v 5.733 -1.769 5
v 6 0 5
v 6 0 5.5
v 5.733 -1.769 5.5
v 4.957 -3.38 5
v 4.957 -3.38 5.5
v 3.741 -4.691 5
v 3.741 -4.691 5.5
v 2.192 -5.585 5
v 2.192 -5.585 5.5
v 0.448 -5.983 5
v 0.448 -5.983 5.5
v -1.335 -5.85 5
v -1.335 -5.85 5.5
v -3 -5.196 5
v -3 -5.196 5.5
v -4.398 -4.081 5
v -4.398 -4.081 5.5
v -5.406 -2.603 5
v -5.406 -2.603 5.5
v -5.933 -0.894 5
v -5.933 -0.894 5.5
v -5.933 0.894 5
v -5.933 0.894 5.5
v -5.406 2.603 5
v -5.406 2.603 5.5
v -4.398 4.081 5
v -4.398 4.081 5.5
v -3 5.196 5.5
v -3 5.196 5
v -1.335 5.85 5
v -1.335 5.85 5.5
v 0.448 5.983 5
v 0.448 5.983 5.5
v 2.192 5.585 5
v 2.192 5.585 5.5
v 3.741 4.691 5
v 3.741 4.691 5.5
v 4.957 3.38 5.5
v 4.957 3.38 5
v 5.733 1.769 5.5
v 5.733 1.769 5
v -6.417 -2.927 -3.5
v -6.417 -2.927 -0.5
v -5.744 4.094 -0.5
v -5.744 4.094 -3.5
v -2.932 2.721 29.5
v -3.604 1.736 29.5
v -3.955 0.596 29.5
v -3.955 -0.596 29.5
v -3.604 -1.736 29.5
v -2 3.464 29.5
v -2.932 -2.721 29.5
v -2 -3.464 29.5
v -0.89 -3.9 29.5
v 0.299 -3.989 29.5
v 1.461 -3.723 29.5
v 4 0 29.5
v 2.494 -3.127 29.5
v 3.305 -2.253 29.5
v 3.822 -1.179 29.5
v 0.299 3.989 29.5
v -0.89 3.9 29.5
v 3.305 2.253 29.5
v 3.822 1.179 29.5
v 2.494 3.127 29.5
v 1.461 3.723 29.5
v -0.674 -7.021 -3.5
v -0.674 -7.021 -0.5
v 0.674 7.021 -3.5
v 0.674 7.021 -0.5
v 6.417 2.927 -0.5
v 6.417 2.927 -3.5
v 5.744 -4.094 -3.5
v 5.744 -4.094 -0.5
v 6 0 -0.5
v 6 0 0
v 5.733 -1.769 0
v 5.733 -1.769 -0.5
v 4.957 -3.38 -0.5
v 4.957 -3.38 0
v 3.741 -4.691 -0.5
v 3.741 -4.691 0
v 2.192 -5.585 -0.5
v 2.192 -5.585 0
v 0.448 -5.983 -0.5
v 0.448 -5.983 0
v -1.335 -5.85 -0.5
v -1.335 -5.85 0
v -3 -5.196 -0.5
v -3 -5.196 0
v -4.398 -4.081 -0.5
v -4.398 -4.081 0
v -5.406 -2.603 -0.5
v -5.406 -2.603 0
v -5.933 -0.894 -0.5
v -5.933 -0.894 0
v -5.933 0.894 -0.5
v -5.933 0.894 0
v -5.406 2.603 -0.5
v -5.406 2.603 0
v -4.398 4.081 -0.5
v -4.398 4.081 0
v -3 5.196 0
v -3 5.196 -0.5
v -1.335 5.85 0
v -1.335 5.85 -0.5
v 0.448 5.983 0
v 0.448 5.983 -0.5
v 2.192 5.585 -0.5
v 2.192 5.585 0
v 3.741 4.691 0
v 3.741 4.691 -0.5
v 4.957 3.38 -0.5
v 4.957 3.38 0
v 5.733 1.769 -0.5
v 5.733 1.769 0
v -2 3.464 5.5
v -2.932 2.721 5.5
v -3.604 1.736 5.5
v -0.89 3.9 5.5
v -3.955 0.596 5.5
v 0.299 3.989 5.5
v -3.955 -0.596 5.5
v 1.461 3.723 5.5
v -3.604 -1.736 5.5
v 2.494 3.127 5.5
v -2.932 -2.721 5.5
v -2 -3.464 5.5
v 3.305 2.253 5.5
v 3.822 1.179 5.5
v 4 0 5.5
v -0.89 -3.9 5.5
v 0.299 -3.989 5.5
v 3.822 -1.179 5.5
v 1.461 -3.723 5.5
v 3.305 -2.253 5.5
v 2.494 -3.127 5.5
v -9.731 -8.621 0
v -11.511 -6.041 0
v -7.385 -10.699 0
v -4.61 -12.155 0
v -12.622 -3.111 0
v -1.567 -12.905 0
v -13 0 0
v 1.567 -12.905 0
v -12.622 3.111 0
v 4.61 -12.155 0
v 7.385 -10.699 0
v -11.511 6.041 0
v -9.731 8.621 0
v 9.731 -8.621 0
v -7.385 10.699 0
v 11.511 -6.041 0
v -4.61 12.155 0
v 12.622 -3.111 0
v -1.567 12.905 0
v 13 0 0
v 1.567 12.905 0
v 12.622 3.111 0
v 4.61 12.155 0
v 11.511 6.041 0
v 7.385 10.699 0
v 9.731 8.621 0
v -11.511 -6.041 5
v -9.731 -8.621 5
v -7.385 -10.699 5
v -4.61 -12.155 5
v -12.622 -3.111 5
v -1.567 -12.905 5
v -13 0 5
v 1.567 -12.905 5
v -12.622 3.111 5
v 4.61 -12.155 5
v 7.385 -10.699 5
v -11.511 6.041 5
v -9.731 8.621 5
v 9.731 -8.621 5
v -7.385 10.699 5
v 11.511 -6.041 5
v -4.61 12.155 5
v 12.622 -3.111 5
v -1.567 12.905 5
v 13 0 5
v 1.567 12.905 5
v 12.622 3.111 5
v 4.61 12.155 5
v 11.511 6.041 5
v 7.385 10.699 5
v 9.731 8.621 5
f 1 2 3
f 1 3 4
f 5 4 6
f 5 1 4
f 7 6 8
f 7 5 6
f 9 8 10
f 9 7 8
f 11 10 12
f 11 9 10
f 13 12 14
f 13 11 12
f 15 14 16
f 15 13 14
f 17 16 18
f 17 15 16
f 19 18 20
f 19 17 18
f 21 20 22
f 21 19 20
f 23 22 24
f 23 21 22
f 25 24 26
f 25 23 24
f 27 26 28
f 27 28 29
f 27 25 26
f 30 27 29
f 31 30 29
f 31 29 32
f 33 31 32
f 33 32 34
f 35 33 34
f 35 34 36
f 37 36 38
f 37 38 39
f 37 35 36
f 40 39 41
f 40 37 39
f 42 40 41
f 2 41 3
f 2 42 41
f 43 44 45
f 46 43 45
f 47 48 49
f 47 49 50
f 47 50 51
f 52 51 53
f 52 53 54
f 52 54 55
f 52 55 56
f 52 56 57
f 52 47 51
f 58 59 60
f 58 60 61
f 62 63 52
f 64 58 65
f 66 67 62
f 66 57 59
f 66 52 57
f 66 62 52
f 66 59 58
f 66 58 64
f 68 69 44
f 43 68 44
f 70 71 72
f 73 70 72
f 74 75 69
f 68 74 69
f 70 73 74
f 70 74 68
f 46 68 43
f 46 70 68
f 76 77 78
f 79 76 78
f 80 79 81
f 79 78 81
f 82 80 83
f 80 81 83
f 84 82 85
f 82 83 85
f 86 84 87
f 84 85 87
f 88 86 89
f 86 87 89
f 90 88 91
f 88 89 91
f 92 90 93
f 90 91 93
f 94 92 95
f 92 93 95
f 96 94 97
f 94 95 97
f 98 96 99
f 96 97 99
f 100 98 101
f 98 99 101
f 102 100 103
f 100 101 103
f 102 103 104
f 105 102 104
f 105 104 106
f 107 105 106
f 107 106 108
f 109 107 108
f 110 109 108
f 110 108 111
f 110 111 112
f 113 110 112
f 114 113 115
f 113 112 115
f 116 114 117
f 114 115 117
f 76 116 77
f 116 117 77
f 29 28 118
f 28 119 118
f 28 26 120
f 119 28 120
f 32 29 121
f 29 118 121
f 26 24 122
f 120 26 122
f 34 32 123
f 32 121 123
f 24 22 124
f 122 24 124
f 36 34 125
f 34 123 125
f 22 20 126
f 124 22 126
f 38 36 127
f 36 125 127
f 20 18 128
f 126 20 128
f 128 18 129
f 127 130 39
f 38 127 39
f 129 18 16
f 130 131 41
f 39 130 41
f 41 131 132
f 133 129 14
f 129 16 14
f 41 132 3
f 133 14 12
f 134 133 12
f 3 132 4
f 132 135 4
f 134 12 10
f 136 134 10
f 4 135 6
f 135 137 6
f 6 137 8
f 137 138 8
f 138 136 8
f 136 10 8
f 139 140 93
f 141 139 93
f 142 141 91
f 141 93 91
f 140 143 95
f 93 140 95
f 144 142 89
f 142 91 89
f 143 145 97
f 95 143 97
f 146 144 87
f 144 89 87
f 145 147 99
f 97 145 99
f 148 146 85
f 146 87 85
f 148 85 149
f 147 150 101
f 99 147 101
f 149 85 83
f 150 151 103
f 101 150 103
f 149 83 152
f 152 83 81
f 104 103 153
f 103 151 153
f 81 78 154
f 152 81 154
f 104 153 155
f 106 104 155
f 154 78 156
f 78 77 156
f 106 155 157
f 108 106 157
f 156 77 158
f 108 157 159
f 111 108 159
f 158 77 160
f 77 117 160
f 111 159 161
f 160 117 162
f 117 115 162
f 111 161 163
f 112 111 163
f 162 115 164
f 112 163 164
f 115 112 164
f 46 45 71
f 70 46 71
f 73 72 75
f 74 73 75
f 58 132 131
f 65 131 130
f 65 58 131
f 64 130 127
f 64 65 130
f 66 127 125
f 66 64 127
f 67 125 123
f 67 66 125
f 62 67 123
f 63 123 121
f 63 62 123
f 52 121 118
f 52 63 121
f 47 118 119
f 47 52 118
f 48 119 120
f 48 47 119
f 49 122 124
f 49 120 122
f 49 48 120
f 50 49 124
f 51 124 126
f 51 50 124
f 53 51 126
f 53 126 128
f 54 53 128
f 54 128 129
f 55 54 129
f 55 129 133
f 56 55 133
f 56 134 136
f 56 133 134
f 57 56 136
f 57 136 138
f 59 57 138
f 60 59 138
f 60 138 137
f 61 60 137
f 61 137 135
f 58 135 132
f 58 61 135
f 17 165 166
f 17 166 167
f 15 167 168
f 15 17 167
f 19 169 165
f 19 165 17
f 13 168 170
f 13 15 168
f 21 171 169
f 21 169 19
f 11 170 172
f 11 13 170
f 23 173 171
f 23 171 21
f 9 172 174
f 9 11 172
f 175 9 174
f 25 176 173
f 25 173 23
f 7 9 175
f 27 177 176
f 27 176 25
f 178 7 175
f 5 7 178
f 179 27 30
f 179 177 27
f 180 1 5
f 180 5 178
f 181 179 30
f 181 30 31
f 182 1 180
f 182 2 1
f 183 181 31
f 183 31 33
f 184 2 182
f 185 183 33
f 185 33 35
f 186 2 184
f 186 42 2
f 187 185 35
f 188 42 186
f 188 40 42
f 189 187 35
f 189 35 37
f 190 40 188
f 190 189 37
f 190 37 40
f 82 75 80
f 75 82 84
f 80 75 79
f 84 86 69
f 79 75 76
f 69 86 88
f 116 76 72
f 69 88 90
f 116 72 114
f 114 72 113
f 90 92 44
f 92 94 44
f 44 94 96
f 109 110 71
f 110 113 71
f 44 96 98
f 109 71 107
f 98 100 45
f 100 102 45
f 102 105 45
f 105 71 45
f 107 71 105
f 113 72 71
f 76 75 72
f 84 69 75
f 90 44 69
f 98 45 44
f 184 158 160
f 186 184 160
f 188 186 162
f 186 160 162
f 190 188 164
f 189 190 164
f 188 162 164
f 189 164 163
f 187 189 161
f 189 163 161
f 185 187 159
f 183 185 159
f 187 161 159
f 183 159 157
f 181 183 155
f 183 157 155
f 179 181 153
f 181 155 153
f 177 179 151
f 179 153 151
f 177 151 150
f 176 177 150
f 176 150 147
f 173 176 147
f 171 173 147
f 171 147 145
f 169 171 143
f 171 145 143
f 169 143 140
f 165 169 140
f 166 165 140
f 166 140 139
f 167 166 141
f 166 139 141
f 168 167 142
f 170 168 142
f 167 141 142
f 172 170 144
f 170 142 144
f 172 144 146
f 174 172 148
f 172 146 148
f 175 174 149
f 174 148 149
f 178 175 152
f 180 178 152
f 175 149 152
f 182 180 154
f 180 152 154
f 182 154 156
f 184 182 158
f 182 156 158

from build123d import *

# Parameters (mm, degrees)
SKETCH1_R           = 13
BOSS_EXTRUDE1_DEPTH = 5
SKETCH12_R          = 4
CUT_EXTRUDE6_DEPTH  = 5
SKETCH13_R          = 6
BOSS_EXTRUDE7_DEPTH = 0.5
CUT_EXTRUDE7_START  = -0.5
SKETCH14_R          = 4
CUT_EXTRUDE7_DEPTH  = 0.5
BOSS_EXTRUDE8_DEPTH = 3
BOSS_EXTRUDE9_START = 30
SKETCH16_R          = 4
BOSS_EXTRUDE9_DEPTH = 30


with BuildPart() as part:
    # Sketch1 → Boss-Extrude1 (new body)
    with BuildSketch(Plane.XY):
        Circle(SKETCH1_R)
    extrude(amount=BOSS_EXTRUDE1_DEPTH)

    # Sketch12 → Cut-Extrude6 (cut)
    with BuildSketch(Plane.XY.offset(5)):
        Circle(SKETCH12_R)
    extrude(amount=-CUT_EXTRUDE6_DEPTH, mode=Mode.SUBTRACT)

    # Sketch13 → Boss-Extrude7 (add)
    with BuildSketch(Plane(origin=(0, 0, 0), x_dir=(-1, 0, 0), z_dir=(0, 0, -1))):
        with Locations(Location((0, 0, 0), (0, 0, 180))):
            Circle(SKETCH13_R)
    boss_extrude7 = extrude(amount=BOSS_EXTRUDE7_DEPTH)

    # Sketch14 → Cut-Extrude7 (cut)
    with BuildSketch(Plane(origin=(0, 0, -0.5), x_dir=(-1, 0, 0), z_dir=(0, 0, -1)).offset(CUT_EXTRUDE7_START)):
        with Locations(Location((0, 0, 0), (0, 0, 180))):
            Circle(SKETCH14_R)
    cut_extrude7 = extrude(amount=CUT_EXTRUDE7_DEPTH, mode=Mode.SUBTRACT)

    # Mirror2: Boss-Extrude7, Cut-Extrude7 across plane
    add(boss_extrude7.mirror(Plane(origin=(0, 0, 2.5), x_dir=(1, 0, 0), z_dir=(0, 0, -1))))
    add(cut_extrude7.mirror(Plane(origin=(0, 0, 2.5), x_dir=(1, 0, 0), z_dir=(0, 0, -1))), mode=Mode.SUBTRACT)

    # Sketch15 → Boss-Extrude8 (add)
    with BuildSketch(Plane(origin=(0, 0, -0.5), x_dir=(-1, 0, 0), z_dir=(0, 0, -1))):
        Polygon((5.743830787, 4.094007051), (-0.673598715, 7.021306902), (-6.417429503, 2.927299852), (-5.743830787, -4.094007051), (0.673598715, -7.021306902), (6.417429503, -2.927299852), align=None)
    extrude(amount=BOSS_EXTRUDE8_DEPTH)

    # Sketch16 → Boss-Extrude9 (add)
    with BuildSketch(Plane.XY.offset(-0.5).offset(BOSS_EXTRUDE9_START)):
        Circle(SKETCH16_R)
    extrude(amount=-BOSS_EXTRUDE9_DEPTH)


solid = part.part
